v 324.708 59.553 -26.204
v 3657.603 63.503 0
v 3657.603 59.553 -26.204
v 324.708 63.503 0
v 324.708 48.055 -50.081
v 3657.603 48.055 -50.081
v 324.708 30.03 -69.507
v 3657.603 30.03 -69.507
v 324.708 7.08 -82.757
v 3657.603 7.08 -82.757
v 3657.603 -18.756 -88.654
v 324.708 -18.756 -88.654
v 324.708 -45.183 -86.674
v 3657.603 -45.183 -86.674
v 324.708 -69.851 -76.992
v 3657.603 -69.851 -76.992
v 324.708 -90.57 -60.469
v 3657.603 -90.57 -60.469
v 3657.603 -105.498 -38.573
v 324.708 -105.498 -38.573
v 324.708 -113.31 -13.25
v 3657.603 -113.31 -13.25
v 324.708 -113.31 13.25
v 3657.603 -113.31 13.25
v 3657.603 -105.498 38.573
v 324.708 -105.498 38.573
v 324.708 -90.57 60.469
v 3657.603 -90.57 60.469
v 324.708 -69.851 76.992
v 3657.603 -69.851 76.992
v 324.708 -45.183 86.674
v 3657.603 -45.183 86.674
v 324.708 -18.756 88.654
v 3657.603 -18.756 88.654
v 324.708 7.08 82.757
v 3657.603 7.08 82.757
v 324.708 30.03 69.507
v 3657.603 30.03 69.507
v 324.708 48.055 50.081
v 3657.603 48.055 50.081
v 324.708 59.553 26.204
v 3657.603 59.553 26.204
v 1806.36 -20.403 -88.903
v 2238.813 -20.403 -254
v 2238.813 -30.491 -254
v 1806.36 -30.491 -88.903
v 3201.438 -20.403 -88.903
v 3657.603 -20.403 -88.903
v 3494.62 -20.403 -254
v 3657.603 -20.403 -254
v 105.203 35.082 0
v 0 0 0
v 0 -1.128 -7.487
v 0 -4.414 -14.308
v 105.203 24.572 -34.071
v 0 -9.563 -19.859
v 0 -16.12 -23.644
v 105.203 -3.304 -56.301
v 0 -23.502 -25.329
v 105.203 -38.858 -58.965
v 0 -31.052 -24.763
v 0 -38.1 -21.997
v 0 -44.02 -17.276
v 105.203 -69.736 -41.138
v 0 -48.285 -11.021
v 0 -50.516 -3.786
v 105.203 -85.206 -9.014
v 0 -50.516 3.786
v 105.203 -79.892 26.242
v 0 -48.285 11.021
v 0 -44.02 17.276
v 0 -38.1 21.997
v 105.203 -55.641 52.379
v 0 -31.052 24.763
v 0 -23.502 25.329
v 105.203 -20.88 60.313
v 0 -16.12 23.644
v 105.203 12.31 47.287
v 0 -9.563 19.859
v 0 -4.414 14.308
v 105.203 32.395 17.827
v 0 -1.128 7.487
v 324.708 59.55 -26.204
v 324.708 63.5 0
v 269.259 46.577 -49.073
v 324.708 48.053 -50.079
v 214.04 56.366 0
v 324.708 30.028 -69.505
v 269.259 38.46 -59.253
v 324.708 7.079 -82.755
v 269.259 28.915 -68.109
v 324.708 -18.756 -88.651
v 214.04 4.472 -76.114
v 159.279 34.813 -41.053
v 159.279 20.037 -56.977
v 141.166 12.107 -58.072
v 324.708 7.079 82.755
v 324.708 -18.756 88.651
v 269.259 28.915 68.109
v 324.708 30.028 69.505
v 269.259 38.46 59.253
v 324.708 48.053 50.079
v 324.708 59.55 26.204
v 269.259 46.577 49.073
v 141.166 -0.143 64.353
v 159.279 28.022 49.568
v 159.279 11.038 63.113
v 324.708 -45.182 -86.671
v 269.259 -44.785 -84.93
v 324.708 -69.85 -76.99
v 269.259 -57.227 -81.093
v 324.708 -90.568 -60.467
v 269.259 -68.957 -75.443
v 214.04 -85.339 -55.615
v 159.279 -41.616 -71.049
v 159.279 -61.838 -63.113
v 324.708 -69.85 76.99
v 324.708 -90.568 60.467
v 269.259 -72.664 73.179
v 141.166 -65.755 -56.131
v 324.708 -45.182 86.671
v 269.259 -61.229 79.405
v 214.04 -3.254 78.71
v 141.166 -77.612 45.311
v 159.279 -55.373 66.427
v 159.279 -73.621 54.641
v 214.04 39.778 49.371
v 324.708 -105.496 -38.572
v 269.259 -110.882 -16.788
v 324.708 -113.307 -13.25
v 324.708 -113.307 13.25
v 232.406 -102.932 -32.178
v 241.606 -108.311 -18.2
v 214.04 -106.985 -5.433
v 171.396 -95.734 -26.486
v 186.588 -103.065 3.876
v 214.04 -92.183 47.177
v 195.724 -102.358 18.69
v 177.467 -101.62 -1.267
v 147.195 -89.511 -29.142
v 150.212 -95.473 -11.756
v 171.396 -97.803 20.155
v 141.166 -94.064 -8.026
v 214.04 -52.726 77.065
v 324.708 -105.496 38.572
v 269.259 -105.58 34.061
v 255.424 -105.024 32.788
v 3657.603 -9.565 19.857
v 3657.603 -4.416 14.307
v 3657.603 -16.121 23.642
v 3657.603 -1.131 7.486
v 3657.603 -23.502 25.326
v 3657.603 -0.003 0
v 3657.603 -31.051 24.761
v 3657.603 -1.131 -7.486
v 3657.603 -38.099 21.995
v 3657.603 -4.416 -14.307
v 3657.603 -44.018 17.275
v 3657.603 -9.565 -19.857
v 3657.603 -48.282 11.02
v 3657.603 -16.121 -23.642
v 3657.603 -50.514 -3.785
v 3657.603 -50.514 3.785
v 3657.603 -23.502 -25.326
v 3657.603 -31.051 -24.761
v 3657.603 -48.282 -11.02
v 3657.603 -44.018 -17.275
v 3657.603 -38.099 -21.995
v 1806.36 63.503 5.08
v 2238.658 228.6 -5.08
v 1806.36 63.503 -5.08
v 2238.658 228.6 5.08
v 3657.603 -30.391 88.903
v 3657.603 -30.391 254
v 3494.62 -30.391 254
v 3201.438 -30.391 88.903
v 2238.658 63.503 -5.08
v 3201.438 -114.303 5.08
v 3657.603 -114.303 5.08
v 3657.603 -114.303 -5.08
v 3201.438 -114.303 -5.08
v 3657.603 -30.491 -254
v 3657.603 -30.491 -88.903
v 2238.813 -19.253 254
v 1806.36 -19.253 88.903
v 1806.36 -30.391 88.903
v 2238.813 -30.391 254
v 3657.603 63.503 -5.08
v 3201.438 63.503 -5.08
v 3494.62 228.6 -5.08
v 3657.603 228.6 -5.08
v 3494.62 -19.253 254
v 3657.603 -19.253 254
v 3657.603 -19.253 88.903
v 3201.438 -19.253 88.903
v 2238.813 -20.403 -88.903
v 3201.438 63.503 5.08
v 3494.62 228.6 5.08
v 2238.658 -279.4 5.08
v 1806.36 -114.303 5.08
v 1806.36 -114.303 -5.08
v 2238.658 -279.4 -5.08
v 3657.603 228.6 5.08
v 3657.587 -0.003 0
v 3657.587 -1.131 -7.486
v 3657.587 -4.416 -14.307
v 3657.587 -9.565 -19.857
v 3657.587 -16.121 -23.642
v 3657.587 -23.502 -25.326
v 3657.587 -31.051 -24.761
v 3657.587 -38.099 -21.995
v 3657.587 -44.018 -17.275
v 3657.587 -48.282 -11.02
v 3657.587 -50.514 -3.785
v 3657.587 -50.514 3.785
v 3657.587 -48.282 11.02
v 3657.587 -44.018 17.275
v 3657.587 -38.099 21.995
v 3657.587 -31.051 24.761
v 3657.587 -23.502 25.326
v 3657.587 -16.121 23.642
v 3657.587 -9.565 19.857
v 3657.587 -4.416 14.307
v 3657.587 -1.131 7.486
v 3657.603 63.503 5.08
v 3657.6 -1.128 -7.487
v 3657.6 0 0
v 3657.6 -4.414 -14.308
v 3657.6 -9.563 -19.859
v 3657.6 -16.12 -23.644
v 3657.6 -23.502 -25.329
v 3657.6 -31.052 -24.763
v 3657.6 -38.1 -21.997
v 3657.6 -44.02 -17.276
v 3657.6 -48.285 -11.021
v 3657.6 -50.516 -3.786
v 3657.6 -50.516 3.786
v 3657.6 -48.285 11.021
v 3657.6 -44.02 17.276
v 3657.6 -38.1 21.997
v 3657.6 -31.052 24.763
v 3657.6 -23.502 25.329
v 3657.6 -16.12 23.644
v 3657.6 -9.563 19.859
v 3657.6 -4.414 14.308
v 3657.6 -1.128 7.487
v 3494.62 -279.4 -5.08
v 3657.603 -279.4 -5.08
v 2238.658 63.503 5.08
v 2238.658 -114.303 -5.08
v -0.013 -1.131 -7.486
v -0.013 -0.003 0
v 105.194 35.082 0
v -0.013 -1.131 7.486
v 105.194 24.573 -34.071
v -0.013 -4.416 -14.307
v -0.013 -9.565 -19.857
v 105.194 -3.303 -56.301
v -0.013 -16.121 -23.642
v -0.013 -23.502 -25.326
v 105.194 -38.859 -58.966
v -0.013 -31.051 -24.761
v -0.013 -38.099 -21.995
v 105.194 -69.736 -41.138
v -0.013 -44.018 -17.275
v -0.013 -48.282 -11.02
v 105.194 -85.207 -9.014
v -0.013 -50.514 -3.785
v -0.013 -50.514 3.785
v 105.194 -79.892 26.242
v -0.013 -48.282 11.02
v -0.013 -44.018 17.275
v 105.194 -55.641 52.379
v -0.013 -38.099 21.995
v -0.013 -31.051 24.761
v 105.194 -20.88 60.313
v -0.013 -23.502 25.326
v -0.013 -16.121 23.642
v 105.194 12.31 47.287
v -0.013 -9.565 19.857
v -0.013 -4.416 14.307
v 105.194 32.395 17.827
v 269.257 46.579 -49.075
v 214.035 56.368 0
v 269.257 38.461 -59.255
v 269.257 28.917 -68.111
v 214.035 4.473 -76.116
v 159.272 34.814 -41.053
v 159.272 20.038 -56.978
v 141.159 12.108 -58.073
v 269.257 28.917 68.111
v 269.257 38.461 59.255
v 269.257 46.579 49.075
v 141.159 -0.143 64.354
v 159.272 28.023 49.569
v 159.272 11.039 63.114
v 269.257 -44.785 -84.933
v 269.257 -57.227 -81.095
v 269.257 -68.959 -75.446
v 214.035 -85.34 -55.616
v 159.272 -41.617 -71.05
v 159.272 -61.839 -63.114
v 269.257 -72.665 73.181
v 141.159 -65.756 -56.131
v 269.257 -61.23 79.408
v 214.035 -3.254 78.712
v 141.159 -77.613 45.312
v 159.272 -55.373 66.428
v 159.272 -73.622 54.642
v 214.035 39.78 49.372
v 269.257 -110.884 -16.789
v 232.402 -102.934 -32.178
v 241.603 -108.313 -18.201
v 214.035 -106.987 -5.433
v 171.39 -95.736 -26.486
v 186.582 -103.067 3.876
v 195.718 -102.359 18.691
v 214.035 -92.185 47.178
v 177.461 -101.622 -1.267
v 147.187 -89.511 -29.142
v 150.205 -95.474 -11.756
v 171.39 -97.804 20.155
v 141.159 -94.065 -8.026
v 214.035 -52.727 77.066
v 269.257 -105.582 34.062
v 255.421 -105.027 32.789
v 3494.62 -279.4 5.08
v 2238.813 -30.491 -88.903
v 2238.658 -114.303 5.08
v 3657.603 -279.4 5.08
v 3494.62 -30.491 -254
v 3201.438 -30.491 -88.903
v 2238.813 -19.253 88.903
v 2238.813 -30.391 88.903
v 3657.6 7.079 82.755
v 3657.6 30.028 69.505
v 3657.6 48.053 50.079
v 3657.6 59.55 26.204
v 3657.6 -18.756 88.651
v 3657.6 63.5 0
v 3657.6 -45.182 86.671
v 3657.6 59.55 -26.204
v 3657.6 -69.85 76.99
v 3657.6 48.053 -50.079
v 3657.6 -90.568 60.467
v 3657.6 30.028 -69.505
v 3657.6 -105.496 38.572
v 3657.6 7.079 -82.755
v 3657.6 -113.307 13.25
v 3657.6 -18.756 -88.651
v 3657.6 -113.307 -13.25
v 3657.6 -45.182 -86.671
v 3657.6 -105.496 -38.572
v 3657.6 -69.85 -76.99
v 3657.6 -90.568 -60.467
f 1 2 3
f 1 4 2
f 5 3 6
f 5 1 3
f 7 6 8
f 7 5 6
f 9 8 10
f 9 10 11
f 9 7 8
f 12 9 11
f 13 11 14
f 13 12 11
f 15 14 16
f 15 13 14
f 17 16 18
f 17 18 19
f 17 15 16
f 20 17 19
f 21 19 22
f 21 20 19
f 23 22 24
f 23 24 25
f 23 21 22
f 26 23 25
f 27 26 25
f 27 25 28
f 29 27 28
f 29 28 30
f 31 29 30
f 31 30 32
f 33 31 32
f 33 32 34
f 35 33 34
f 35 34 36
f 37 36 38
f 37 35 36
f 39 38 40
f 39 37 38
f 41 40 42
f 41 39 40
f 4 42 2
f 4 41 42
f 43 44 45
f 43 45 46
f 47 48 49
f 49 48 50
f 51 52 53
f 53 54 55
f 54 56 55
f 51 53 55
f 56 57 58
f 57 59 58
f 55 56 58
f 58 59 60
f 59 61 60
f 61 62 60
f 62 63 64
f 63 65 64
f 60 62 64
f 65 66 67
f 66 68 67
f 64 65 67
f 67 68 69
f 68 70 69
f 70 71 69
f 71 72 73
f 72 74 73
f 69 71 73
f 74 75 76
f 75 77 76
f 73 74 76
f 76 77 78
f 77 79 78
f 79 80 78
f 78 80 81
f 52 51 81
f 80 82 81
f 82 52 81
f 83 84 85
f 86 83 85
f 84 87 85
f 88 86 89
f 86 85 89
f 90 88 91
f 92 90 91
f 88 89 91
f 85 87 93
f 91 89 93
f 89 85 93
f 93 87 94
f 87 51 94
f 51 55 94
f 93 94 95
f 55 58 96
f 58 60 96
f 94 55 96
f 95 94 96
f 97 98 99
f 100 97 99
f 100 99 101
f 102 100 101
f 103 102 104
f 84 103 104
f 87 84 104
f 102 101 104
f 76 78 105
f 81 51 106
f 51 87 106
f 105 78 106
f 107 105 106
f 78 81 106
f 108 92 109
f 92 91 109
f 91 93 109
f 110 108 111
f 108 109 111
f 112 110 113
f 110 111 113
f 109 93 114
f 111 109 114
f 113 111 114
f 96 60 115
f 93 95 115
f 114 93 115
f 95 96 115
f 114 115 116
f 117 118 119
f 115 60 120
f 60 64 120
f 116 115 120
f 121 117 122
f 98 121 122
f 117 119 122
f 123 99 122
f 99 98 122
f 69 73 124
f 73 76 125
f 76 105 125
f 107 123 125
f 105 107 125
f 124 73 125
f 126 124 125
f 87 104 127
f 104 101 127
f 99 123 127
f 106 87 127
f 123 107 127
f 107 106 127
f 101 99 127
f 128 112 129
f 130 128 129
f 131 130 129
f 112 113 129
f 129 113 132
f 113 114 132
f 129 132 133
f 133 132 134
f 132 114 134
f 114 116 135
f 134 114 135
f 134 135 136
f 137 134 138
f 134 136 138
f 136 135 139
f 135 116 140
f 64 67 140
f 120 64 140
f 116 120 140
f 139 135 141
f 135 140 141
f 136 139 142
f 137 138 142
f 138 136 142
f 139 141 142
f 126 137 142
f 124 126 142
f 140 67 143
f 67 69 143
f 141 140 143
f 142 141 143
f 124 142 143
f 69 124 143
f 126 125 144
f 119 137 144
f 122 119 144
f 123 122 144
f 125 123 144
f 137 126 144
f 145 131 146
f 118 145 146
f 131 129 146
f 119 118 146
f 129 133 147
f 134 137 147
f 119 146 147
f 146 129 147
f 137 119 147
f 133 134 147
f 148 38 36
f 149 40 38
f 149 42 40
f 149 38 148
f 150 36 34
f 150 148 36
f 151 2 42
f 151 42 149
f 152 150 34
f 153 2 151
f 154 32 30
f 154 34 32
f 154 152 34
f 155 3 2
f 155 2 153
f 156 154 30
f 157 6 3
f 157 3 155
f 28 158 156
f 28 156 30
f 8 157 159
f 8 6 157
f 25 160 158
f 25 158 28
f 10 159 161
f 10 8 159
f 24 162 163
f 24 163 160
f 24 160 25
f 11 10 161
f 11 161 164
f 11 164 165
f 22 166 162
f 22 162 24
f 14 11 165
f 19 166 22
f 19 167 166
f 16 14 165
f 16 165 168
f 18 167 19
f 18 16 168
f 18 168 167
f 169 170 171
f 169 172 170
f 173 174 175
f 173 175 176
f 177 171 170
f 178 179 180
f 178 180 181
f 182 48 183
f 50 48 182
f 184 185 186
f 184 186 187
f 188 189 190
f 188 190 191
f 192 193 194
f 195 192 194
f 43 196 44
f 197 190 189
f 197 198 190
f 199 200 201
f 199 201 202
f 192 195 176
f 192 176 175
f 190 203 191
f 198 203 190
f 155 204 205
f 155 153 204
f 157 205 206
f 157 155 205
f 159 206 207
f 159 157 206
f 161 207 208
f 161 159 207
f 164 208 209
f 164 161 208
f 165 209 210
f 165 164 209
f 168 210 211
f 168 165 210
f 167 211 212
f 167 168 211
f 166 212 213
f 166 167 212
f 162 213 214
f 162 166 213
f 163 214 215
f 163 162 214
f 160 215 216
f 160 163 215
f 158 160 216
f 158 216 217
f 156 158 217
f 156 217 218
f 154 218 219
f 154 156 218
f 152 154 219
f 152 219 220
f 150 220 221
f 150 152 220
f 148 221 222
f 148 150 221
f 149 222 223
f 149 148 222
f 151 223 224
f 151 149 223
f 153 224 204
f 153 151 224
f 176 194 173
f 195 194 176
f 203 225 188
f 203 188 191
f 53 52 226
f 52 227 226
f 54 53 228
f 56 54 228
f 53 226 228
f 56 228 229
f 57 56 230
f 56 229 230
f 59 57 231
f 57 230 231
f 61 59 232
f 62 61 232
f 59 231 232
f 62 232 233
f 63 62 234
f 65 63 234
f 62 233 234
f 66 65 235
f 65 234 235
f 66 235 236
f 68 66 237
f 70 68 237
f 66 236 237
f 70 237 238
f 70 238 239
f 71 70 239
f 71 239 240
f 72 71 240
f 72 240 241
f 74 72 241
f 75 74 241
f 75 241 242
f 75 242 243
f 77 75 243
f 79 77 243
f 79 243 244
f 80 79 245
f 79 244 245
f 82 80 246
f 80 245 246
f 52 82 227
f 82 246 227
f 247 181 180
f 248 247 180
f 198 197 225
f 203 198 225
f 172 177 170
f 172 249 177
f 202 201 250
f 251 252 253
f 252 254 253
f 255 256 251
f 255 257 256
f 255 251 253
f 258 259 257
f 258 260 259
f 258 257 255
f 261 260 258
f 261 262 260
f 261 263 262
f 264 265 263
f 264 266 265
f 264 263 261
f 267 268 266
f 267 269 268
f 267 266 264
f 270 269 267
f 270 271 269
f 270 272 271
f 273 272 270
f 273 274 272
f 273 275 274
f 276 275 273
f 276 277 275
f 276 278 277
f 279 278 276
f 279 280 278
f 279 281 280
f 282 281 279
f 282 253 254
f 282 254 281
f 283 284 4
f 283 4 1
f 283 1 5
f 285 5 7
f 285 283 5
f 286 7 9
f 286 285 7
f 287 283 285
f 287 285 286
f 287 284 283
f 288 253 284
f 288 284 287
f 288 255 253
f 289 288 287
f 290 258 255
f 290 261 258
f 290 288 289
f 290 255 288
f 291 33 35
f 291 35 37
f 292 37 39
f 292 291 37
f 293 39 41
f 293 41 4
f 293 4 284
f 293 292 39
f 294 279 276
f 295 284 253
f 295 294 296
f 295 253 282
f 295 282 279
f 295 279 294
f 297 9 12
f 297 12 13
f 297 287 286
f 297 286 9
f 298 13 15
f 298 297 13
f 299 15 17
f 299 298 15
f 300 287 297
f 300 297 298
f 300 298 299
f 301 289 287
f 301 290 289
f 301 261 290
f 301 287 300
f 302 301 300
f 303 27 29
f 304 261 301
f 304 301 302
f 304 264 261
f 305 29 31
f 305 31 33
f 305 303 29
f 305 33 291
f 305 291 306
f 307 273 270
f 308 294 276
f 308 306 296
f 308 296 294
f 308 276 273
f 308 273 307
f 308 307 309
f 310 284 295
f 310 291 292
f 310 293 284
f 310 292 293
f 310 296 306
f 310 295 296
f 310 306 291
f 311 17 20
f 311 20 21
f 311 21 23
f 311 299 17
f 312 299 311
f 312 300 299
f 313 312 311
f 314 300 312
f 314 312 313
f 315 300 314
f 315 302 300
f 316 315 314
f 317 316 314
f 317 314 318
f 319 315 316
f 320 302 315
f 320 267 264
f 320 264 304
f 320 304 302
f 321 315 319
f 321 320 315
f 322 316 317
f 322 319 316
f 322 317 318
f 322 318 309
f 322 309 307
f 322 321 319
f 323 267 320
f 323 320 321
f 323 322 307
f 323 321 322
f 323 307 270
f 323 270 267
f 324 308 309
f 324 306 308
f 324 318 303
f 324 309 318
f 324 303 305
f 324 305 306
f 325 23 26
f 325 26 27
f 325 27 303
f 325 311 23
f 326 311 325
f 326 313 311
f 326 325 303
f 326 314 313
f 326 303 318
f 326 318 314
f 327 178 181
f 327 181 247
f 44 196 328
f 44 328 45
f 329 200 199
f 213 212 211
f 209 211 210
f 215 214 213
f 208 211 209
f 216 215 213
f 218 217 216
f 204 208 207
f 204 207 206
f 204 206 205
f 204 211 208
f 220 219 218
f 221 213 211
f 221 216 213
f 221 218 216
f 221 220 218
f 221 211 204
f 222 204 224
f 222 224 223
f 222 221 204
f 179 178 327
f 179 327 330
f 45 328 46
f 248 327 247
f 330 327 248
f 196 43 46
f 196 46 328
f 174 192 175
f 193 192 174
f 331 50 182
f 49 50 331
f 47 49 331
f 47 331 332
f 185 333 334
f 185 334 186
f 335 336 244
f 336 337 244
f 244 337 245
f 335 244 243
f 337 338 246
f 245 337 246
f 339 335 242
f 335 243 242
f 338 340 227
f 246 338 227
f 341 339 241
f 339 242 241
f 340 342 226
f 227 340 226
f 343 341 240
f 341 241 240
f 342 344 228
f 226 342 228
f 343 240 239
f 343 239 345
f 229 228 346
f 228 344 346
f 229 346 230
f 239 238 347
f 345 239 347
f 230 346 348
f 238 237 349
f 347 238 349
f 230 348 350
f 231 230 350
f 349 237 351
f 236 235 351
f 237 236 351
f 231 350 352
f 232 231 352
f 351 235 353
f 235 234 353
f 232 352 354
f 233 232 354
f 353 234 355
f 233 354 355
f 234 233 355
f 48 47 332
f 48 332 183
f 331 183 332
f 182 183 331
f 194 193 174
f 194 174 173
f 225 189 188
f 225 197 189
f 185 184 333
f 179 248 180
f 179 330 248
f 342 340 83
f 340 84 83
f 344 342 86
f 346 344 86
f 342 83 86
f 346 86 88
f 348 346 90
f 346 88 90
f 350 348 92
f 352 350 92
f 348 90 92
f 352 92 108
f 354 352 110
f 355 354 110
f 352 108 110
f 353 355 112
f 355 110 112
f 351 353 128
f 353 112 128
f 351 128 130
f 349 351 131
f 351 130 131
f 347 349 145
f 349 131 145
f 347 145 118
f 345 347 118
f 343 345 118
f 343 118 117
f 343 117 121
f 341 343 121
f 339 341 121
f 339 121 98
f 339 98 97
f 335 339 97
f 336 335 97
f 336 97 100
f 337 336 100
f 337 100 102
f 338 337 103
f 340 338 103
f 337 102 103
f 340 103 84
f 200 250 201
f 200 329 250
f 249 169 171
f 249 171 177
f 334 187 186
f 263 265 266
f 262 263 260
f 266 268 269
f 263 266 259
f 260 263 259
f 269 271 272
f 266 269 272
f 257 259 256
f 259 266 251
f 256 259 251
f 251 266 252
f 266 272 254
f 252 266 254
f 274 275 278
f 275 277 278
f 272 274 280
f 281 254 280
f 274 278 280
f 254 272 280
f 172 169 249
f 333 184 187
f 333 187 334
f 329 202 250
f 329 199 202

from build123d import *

# Parameters (mm, degrees)
BOSS_EXTRUDE2_DEPTH   = 50.8
BOSS_EXTRUDE2_2_DEPTH = 50.8
SKETCH8_W             = 165.09746
SKETCH8_H             = 20.403333325
SKETCH8_H_2           = 20.309182766
CUT_EXTRUDE1_DEPTH    = 762
SKETCH15_OUTSIDE_W    = 1249.4
SKETCH15_OUTSIDE_H    = 919.206
SKETCH15_OUTSIDE_W_2  = 165.09746
SKETCH15_OUTSIDE_H_2  = 11.138484042
CUT_EXTRUDE4_DEPTH    = 762
BOSS_EXTRUDE3_START   = 3657.6
SKETCH19_R            = 25.39746
BOSS_EXTRUDE3_DEPTH   = 3657.6
BOSS_EXTRUDE4_DEPTH   = 5.08
BOSS_EXTRUDE4_2_DEPTH = 5.08
BOSS_EXTRUDE5_DEPTH   = 5.08
BOSS_EXTRUDE5_2_DEPTH = 5.08
BOSS_EXTRUDE6_DEPTH   = 50.8
BOSS_EXTRUDE6_2_DEPTH = 50.8
SKETCH26_OUTSIDE_W    = 1255.5
SKETCH26_OUTSIDE_H    = 1255.5
SKETCH26_OUTSIDE_W_2  = 165.09746
SKETCH26_OUTSIDE_H_2  = 10.087483909
CUT_EXTRUDE7_DEPTH    = 508
SKETCH32_OUTSIDE_W    = 1255.5
SKETCH32_OUTSIDE_H    = 1255.5
SKETCH32_OUTSIDE_W_2  = 165.09746
SKETCH32_OUTSIDE_H_2  = 11.138484042
CUT_EXTRUDE16_DEPTH   = 508


with BuildPart() as part:
    # Sketch1 → Revolve-Thin10 (revolve)
    with BuildSketch(Plane.XY):
        with BuildLine():
            Line((-0.012988062, -0.00254), (3657.60254, -0.00254))
            Line((3657.60254, -0.00254), (3657.60254, 63.50254))
            Line((3657.60254, 63.50254), (324.708031431, 63.50254))
            ThreePointArc((324.708031431, 63.50254), (159.271762972, 47.477300947), (-0.012988062, -0.00254))
        make_face()
        with BuildLine():
            Line((0, 0), (3657.6, 0))
            Line((3657.6, 0), (3657.6, 63.5))
            Line((3657.6, 63.5), (324.708031431, 63.5))
            ThreePointArc((324.708031431, 63.5), (159.27862377, 47.476054557), (0, 0))
        make_face(mode=Mode.SUBTRACT)
    revolve(axis=Axis((3626.499601813, -25.4, 0), (-1, 0, 0)))

    # Sketch19 → Boss-Extrude3 (add)
    with BuildSketch(Plane(origin=(-0.012988062, 0, 0), x_dir=(0, 0, -1), z_dir=(1, 0, 0)).offset(BOSS_EXTRUDE3_START)):
        with Locations(Location((0, -25.4, 0), (0, 0, 90))):
            Circle(SKETCH19_R)
    extrude(amount=-BOSS_EXTRUDE3_DEPTH)


with BuildPart() as body_2:
    # Sketch4 → Boss-Extrude2 (new body)
    with BuildSketch(Plane(origin=(0, 0, 0), x_dir=(1, 0, 0), z_dir=(0, 1, 0))):
        Polygon((3201.438104891, 88.90254), (3657.60254, 88.90254), (3657.60254, 254), (3494.61986844, 254), align=None)
    extrude(amount=-BOSS_EXTRUDE2_DEPTH)

    # Sketch8 → Cut-Extrude1 (cut)
    with BuildSketch(Plane(origin=(3657.60254, 0, 0), x_dir=(0, 0, -1), z_dir=(1, 0, 0))):
        with Locations((171.45127, -10.201666663)):
            Rectangle(SKETCH8_W, SKETCH8_H)
        with Locations((171.45127, -40.645408617)):
            Rectangle(SKETCH8_W, SKETCH8_H_2)
    extrude(amount=-CUT_EXTRUDE1_DEPTH, mode=Mode.SUBTRACT)


with BuildPart() as body_3:
    # Sketch4 → Boss-Extrude2 2 (new body)
    with BuildSketch(Plane(origin=(0, 0, 0), x_dir=(1, 0, 0), z_dir=(0, 1, 0))):
        Polygon((3657.60254, -254), (3657.60254, -88.90254), (3201.438104891, -88.90254), (3494.61986844, -254), align=None)
    extrude(amount=-BOSS_EXTRUDE2_2_DEPTH)

    # Sketch15 outside → Cut-Extrude4 (cut)
    with BuildSketch(Plane(origin=(3657.60254, 0, 0), x_dir=(0, 0, -1), z_dir=(1, 0, 0))):
        with Locations((0, -25.4)):
            Rectangle(SKETCH15_OUTSIDE_W, SKETCH15_OUTSIDE_H)
        with Locations((-171.45127, -24.821822945)):
            Rectangle(SKETCH15_OUTSIDE_W_2, SKETCH15_OUTSIDE_H_2, mode=Mode.SUBTRACT)
    extrude(amount=-CUT_EXTRUDE4_DEPTH, mode=Mode.SUBTRACT)


with BuildPart() as body_4:
    # Sketch20 → Boss-Extrude4 (new, symmetric)
    with BuildSketch(Plane.XY):
        Polygon((3201.438104891, 63.50254), (3657.60254, 63.50254), (3657.60254, 228.6), (3494.61986844, 228.6), align=None)
    extrude(amount=BOSS_EXTRUDE4_DEPTH, both=True)


with BuildPart() as body_5:
    # Sketch20 → Boss-Extrude4 2 (new, symmetric)
    with BuildSketch(Plane.XY):
        Polygon((3657.60254, -279.4), (3657.60254, -114.30254), (3201.438104891, -114.30254), (3494.61986844, -279.4), align=None)
    extrude(amount=BOSS_EXTRUDE4_2_DEPTH, both=True)


with BuildPart() as body_6:
    # Sketch24 → Boss-Extrude5 (new, symmetric)
    with BuildSketch(Plane.XY):
        Polygon((2238.658103721, 228.6), (1806.360058945, 63.50254), (2238.658103721, 63.50254), align=None)
    extrude(amount=BOSS_EXTRUDE5_DEPTH, both=True)


with BuildPart() as body_7:
    # Sketch24 → Boss-Extrude5 2 (new, symmetric)
    with BuildSketch(Plane.XY):
        Polygon((2238.658103721, -114.30254), (1806.360058945, -114.30254), (2238.658103721, -279.4), align=None)
    extrude(amount=BOSS_EXTRUDE5_2_DEPTH, both=True)


with BuildPart() as body_8:
    # Sketch25 → Boss-Extrude6 (new body)
    with BuildSketch(Plane(origin=(0, 0, 0), x_dir=(1, 0, 0), z_dir=(0, 1, 0))):
        Polygon((1806.360058945, 88.90254), (2238.812613306, 88.90254), (2238.812613306, 254), align=None)
    extrude(amount=-BOSS_EXTRUDE6_DEPTH)

    # Sketch26 outside → Cut-Extrude7 (cut)
    with BuildSketch(Plane(origin=(2238.812613306, 0, 0), x_dir=(0, 0, -1), z_dir=(1, 0, 0))):
        with Locations((0, -25.4)):
            Rectangle(SKETCH26_OUTSIDE_W, SKETCH26_OUTSIDE_H)
        with Locations((171.45127, -25.44707528)):
            Rectangle(SKETCH26_OUTSIDE_W_2, SKETCH26_OUTSIDE_H_2, mode=Mode.SUBTRACT)
    extrude(amount=-CUT_EXTRUDE7_DEPTH, mode=Mode.SUBTRACT)


with BuildPart() as body_9:
    # Sketch25 → Boss-Extrude6 2 (new body)
    with BuildSketch(Plane(origin=(0, 0, 0), x_dir=(1, 0, 0), z_dir=(0, 1, 0))):
        Polygon((2238.812613306, -254), (2238.812613306, -88.90254), (1806.360058945, -88.90254), align=None)
    extrude(amount=-BOSS_EXTRUDE6_2_DEPTH)

    # Sketch32 outside → Cut-Extrude16 (cut)
    with BuildSketch(Plane(origin=(2238.812613306, 0, 0), x_dir=(0, 0, -1), z_dir=(1, 0, 0))):
        with Locations((0, -25.4)):
            Rectangle(SKETCH32_OUTSIDE_W, SKETCH32_OUTSIDE_H)
        with Locations((-171.45127, -24.821822945)):
            Rectangle(SKETCH32_OUTSIDE_W_2, SKETCH32_OUTSIDE_H_2, mode=Mode.SUBTRACT)
    extrude(amount=-CUT_EXTRUDE16_DEPTH, mode=Mode.SUBTRACT)


solid = Compound([part.part, body_2.part, body_3.part, body_4.part, body_5.part, body_6.part, body_7.part, body_8.part, body_9.part])
